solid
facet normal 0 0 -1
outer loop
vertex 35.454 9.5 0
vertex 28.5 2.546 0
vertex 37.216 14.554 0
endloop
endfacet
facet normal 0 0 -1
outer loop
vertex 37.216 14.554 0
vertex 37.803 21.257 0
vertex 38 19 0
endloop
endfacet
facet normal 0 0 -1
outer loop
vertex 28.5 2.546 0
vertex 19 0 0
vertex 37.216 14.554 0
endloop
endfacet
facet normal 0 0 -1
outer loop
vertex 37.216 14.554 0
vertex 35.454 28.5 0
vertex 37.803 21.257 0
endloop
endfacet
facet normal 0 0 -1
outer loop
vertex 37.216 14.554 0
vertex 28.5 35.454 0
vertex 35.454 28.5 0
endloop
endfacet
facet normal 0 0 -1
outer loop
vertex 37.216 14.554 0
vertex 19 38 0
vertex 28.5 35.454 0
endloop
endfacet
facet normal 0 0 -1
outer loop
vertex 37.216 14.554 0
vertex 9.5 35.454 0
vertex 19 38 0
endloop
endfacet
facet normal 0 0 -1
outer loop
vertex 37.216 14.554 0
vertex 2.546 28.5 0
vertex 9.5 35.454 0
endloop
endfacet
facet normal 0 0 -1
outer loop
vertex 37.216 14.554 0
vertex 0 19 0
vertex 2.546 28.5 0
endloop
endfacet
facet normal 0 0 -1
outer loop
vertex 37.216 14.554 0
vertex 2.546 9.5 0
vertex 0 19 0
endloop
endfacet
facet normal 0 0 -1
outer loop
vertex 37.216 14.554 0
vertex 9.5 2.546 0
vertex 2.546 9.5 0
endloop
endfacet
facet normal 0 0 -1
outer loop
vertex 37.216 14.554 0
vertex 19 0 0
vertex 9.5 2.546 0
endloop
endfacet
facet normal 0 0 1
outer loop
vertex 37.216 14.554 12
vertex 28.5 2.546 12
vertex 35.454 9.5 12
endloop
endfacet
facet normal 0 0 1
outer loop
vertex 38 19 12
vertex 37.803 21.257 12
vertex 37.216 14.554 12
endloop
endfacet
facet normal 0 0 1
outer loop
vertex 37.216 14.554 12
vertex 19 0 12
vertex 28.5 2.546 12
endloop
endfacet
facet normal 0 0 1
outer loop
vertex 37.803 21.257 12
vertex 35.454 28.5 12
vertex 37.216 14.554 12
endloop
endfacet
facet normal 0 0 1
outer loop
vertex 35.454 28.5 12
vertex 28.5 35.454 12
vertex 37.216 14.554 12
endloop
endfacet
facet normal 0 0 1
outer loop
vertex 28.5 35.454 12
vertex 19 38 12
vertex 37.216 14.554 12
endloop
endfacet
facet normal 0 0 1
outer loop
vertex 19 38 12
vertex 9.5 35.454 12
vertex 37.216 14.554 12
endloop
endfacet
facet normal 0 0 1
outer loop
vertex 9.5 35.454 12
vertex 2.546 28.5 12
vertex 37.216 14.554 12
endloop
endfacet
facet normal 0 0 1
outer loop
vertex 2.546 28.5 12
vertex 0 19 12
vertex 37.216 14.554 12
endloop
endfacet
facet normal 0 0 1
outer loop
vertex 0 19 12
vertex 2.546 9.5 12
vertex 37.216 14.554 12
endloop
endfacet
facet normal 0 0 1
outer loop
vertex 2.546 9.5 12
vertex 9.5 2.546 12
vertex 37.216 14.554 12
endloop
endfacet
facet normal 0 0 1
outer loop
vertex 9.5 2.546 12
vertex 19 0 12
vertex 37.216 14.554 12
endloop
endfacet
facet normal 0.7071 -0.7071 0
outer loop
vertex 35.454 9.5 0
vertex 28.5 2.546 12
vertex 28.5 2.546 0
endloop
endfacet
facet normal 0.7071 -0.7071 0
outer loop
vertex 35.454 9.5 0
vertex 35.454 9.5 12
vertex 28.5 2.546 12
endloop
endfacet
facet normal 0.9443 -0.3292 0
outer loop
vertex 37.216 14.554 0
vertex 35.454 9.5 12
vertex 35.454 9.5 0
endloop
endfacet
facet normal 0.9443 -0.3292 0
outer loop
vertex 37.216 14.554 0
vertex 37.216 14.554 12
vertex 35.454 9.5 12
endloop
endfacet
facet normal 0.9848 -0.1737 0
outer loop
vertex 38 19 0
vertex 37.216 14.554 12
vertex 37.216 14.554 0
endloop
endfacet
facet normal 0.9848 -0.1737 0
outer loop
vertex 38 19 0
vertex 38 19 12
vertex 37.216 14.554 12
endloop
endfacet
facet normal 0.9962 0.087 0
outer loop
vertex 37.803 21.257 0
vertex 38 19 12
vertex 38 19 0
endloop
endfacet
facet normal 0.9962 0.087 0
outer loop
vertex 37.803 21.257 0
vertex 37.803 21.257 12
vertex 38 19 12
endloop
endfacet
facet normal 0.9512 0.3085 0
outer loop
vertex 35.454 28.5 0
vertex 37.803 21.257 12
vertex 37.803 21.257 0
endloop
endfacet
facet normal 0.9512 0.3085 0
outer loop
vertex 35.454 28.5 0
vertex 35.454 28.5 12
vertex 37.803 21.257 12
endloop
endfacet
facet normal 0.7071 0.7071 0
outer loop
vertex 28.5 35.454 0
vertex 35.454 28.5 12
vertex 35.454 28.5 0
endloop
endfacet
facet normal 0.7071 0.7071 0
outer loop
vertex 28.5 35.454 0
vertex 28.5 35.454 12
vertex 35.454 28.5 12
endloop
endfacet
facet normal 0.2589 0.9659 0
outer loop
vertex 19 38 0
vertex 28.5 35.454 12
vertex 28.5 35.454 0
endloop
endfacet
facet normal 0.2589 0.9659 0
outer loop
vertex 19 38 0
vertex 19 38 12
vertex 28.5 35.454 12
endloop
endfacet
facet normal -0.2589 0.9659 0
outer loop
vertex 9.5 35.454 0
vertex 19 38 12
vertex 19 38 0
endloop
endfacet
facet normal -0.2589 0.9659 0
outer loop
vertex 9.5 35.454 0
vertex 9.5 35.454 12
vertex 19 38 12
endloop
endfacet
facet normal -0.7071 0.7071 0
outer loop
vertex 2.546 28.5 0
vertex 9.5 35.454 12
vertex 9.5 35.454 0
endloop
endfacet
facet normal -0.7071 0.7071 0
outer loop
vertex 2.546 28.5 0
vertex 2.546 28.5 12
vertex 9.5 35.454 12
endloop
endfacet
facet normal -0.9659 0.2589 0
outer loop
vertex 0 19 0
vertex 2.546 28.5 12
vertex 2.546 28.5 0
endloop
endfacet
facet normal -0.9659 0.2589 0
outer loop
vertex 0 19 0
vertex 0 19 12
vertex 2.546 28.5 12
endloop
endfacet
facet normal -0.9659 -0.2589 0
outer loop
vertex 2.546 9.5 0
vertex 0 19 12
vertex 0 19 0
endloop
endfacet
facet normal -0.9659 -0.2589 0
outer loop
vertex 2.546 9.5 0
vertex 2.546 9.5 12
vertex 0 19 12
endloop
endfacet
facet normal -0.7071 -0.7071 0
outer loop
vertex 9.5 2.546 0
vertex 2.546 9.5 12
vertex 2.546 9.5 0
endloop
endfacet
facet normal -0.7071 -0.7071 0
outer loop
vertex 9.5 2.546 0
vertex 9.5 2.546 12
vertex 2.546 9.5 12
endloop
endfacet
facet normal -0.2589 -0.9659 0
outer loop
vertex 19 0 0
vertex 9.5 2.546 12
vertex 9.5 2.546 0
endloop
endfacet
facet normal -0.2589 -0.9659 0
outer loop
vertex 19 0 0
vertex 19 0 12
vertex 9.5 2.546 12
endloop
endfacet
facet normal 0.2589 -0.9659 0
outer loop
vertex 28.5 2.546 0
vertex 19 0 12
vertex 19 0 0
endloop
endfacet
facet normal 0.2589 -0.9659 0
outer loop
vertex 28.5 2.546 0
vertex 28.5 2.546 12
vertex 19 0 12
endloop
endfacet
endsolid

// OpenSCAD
$fn = 32;

// ----------------------------------------------------------------------
// Eccentric disc: egg, 12 mm thick
// ----------------------------------------------------------------------

// --- parameters (mm) ---
profile_height = 12;      // extrusion height
profile_points = 14;      // points of the closed outline

profile = [[0, 19], [2.546, 9.5], [9.5, 2.546], [19, 0], [28.5, 2.546], [35.454, 9.5], [37.216, 14.554], [38, 19], [37.803, 21.257], [35.454, 28.5], [28.5, 35.454], [19, 38], [9.5, 35.454], [2.546, 28.5]];  // single closed polygon, 14 points, counter clockwise

// --- the one profile operation ---
linear_extrude(height = profile_height) polygon(points = profile);
